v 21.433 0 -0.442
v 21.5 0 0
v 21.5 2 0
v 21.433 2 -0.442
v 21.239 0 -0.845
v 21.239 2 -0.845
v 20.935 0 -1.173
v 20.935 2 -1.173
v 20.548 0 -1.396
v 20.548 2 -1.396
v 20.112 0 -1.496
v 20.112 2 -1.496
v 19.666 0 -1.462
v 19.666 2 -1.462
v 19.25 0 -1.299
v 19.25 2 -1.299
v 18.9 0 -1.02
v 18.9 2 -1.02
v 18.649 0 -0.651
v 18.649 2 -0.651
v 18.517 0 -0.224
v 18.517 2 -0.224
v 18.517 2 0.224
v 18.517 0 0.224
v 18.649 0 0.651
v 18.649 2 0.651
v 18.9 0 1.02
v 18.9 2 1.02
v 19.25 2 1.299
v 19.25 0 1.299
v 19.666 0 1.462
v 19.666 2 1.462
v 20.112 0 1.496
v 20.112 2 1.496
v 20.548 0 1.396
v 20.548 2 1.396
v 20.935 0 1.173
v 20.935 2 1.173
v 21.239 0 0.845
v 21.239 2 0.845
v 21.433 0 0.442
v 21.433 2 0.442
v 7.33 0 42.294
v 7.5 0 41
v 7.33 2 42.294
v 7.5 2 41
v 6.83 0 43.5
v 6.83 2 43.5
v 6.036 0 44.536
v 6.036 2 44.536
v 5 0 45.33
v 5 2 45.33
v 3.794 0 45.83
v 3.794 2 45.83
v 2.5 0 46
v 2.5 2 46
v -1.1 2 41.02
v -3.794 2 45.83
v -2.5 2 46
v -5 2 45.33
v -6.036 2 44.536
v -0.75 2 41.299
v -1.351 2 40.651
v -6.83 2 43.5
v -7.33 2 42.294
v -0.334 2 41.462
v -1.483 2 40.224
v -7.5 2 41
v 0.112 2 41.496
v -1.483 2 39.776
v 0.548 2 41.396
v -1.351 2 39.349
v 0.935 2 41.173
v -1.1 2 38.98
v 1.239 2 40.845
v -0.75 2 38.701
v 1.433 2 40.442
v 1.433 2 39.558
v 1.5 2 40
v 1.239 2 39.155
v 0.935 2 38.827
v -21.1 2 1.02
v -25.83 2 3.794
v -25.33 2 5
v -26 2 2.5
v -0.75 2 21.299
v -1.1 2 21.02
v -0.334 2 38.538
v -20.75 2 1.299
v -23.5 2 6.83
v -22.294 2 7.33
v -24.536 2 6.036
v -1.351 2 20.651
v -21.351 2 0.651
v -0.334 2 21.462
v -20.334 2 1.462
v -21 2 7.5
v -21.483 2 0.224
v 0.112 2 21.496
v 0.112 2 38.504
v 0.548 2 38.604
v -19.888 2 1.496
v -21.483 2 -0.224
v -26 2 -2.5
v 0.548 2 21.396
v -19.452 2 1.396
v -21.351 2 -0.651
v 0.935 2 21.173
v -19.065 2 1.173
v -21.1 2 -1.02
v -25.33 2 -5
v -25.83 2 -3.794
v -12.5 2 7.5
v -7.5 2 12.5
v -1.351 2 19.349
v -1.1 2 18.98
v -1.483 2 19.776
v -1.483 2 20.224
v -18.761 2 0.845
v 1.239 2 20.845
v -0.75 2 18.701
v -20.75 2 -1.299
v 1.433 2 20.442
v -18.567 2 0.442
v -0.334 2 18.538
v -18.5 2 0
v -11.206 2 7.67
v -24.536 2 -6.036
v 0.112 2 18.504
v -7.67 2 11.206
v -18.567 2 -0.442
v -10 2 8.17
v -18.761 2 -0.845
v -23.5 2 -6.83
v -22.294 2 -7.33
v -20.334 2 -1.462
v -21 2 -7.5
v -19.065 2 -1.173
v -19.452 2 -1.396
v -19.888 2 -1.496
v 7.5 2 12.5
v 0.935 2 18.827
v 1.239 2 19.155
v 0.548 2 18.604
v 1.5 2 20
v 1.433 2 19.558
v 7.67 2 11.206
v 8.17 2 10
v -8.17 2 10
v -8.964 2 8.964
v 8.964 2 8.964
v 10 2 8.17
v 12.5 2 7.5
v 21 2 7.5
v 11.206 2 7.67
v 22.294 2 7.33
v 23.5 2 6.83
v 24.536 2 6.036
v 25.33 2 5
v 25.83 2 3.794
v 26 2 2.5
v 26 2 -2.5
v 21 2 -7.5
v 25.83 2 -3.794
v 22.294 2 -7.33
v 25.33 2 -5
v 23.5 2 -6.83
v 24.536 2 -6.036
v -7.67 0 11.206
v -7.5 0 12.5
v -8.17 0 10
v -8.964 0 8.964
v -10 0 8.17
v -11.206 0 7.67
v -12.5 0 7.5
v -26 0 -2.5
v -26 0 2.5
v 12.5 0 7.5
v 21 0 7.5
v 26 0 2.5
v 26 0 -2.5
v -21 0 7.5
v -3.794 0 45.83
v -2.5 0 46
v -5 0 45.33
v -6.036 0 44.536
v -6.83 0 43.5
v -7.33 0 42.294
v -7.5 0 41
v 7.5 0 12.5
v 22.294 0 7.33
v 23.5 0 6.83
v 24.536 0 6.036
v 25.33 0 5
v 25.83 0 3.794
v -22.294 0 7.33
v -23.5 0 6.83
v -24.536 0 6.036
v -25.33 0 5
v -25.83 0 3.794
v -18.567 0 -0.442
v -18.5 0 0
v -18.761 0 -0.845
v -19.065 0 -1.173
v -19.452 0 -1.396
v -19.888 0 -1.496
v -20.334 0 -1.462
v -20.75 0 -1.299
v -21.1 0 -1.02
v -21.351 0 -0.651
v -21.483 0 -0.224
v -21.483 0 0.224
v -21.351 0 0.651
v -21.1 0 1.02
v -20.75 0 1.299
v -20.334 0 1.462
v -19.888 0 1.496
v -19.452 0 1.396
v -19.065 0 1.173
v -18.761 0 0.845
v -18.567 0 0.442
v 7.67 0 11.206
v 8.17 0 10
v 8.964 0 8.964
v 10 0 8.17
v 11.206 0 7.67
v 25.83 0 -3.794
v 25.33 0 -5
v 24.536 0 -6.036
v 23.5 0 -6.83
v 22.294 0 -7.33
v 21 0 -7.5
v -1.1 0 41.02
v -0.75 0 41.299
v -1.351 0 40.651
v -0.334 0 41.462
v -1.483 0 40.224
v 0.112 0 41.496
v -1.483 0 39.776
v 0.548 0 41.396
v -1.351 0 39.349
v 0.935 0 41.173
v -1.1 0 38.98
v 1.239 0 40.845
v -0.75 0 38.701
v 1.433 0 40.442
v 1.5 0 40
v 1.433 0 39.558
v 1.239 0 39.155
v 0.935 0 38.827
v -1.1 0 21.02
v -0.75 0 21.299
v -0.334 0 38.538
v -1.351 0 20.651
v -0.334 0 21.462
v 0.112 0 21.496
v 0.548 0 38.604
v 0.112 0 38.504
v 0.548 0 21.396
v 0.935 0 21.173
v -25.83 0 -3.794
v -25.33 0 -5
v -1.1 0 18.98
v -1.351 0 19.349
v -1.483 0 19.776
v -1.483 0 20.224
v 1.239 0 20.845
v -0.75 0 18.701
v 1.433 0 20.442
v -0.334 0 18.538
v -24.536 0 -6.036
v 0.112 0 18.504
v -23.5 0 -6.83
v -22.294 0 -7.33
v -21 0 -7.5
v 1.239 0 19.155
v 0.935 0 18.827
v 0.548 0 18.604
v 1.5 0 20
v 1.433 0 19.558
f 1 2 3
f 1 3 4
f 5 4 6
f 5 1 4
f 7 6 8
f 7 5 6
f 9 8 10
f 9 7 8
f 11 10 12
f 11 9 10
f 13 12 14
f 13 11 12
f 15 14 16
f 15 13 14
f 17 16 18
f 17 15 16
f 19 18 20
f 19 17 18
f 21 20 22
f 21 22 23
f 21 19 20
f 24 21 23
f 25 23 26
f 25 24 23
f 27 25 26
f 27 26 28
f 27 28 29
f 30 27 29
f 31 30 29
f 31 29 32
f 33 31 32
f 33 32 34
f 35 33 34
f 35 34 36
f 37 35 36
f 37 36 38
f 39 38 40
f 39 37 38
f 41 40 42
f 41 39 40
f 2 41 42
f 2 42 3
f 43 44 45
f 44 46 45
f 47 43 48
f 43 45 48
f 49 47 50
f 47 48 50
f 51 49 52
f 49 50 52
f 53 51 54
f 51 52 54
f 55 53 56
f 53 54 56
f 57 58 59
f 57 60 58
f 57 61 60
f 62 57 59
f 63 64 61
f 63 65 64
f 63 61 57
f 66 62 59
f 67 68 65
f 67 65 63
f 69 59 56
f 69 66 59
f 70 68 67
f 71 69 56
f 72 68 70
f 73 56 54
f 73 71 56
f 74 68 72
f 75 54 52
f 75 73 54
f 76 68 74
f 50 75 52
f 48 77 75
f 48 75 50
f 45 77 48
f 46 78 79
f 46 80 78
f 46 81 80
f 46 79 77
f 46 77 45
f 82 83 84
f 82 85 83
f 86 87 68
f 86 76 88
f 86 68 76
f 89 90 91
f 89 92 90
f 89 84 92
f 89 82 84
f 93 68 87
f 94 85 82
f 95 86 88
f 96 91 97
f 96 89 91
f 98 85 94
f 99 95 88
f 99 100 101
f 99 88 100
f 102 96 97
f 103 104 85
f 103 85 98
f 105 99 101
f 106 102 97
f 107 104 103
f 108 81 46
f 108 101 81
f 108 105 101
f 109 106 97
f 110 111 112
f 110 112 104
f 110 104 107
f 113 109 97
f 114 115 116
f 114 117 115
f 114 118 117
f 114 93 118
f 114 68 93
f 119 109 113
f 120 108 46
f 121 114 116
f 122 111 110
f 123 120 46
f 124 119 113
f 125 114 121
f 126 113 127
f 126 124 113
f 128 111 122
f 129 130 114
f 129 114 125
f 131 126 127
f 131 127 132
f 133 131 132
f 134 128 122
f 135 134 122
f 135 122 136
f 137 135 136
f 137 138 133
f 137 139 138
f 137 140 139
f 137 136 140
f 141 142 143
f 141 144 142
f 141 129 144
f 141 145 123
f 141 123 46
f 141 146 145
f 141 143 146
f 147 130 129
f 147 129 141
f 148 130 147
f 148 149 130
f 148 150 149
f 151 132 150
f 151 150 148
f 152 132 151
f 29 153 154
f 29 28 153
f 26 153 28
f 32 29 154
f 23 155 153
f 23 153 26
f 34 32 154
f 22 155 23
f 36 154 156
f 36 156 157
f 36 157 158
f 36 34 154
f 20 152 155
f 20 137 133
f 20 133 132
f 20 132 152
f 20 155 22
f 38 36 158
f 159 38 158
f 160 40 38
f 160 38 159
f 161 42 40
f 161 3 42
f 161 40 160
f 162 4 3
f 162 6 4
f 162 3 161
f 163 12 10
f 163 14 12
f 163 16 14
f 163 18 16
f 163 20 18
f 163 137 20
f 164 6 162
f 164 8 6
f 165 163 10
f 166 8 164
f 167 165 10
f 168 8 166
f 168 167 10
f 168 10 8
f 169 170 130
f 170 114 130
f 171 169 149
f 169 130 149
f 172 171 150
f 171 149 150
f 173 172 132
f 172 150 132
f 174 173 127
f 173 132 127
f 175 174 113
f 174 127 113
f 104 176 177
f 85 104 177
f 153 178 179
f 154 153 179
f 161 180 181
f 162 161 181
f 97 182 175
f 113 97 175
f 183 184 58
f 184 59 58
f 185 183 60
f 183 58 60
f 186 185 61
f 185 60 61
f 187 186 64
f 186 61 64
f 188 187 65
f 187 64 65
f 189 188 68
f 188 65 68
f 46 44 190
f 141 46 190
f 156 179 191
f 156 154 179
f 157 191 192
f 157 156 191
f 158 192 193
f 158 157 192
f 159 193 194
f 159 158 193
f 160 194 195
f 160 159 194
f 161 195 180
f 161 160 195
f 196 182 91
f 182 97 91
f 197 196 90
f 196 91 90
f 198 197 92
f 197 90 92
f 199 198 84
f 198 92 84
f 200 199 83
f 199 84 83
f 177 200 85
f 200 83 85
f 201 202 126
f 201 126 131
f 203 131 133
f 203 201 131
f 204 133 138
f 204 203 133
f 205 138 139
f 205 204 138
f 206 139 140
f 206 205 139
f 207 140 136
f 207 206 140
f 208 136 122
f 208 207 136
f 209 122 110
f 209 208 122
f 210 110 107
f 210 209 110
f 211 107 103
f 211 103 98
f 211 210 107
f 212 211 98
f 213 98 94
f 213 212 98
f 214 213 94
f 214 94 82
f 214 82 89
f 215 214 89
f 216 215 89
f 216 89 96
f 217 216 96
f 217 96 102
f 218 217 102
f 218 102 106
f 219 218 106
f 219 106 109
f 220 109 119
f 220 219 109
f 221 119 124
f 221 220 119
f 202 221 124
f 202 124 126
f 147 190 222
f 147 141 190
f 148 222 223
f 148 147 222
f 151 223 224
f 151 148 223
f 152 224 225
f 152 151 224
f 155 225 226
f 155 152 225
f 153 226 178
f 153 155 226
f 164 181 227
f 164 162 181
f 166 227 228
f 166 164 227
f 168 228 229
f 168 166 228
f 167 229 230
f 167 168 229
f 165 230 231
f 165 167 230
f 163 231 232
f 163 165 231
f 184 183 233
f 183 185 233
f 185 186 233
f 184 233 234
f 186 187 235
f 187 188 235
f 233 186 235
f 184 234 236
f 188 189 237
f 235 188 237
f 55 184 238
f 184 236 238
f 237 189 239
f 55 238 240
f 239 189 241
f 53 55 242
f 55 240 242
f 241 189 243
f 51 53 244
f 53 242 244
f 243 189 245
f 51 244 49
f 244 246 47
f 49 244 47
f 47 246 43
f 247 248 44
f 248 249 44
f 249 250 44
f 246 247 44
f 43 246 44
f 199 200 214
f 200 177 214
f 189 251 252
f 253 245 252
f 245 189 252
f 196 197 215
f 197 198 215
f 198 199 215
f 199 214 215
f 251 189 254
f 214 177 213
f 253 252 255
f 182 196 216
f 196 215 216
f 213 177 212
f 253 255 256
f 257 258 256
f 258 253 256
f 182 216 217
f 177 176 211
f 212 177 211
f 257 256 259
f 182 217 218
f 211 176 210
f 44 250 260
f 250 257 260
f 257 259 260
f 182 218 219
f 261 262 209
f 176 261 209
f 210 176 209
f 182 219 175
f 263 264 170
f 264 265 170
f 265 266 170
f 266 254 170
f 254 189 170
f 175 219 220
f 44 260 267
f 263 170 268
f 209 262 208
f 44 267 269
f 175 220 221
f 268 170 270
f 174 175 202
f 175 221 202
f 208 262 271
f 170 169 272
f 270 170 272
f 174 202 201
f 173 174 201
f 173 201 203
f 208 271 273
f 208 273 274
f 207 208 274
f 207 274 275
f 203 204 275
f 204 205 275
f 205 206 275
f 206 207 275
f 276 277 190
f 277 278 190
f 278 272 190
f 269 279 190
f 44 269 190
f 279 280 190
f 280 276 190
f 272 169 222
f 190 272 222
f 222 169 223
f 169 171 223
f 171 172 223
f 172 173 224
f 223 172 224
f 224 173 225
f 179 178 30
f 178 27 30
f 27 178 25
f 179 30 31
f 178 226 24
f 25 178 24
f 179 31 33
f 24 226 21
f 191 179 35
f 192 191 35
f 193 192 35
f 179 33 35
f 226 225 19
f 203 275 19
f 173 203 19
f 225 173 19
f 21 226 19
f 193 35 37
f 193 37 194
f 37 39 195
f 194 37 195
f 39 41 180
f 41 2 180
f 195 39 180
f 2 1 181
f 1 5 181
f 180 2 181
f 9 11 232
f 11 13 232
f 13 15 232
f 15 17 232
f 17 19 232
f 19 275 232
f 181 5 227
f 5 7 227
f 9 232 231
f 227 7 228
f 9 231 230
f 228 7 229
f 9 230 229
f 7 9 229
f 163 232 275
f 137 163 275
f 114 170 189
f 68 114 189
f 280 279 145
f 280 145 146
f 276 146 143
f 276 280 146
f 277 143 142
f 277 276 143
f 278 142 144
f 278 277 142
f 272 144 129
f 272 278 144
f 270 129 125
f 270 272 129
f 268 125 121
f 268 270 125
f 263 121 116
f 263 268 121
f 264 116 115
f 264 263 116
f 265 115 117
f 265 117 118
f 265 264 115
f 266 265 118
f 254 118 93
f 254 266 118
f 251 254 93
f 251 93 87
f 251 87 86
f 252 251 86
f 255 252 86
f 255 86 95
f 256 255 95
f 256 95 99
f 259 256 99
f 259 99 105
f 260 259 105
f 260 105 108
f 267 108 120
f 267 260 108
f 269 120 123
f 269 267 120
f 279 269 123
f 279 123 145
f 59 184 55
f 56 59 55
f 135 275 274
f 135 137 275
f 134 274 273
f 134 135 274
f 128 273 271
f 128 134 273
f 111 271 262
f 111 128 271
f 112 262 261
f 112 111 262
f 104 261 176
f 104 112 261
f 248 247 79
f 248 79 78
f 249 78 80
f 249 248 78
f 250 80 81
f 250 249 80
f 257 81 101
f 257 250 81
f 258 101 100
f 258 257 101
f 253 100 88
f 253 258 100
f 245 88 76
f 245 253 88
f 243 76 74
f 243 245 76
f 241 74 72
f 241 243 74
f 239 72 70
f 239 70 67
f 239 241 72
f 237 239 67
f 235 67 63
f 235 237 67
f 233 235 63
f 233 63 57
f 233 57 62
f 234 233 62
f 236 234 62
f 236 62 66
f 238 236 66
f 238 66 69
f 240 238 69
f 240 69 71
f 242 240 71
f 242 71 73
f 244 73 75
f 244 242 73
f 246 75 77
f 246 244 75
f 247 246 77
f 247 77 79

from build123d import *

# Parameters (mm, degrees)
SKETCH1_R           = 1.5
BOSS_EXTRUDE1_DEPTH = 2
FILLET1_R           = 5


with BuildPart() as part:
    # Sketch1 → Boss-Extrude1 (new body)
    with BuildSketch(Plane(origin=(0, 0, 0), x_dir=(1, 0, 0), z_dir=(0, 1, 0))):
        Polygon((7.5, -46), (7.5, -7.5), (26, -7.5), (26, 7.5), (-26, 7.5), (-26, -7.5), (-7.5, -7.5), (-7.5, -46), align=None)
        with Locations((0, -40)):
            Circle(SKETCH1_R, mode=Mode.SUBTRACT)
        with Locations((0, -20)):
            Circle(SKETCH1_R, mode=Mode.SUBTRACT)
        with Locations((20, 0)):
            Circle(SKETCH1_R, mode=Mode.SUBTRACT)
        with Locations((-20, 0)):
            Circle(SKETCH1_R, mode=Mode.SUBTRACT)
    extrude(amount=BOSS_EXTRUDE1_DEPTH)

    # Fillet1
    fillet1_edges = [part.edges().sort_by_distance(p)[0] for p in [
        (-7.5, 1, 46),
        (-7.5, 1, 7.5),
        (-26, 1, 7.5),
        (-26, 1, -7.5),
        (26, 1, -7.5),
        (26, 1, 7.5),
        (7.5, 1, 7.5),
        (7.5, 1, 46),
    ]]
    fillet(fillet1_edges, radius=FILLET1_R)


solid = part.part
